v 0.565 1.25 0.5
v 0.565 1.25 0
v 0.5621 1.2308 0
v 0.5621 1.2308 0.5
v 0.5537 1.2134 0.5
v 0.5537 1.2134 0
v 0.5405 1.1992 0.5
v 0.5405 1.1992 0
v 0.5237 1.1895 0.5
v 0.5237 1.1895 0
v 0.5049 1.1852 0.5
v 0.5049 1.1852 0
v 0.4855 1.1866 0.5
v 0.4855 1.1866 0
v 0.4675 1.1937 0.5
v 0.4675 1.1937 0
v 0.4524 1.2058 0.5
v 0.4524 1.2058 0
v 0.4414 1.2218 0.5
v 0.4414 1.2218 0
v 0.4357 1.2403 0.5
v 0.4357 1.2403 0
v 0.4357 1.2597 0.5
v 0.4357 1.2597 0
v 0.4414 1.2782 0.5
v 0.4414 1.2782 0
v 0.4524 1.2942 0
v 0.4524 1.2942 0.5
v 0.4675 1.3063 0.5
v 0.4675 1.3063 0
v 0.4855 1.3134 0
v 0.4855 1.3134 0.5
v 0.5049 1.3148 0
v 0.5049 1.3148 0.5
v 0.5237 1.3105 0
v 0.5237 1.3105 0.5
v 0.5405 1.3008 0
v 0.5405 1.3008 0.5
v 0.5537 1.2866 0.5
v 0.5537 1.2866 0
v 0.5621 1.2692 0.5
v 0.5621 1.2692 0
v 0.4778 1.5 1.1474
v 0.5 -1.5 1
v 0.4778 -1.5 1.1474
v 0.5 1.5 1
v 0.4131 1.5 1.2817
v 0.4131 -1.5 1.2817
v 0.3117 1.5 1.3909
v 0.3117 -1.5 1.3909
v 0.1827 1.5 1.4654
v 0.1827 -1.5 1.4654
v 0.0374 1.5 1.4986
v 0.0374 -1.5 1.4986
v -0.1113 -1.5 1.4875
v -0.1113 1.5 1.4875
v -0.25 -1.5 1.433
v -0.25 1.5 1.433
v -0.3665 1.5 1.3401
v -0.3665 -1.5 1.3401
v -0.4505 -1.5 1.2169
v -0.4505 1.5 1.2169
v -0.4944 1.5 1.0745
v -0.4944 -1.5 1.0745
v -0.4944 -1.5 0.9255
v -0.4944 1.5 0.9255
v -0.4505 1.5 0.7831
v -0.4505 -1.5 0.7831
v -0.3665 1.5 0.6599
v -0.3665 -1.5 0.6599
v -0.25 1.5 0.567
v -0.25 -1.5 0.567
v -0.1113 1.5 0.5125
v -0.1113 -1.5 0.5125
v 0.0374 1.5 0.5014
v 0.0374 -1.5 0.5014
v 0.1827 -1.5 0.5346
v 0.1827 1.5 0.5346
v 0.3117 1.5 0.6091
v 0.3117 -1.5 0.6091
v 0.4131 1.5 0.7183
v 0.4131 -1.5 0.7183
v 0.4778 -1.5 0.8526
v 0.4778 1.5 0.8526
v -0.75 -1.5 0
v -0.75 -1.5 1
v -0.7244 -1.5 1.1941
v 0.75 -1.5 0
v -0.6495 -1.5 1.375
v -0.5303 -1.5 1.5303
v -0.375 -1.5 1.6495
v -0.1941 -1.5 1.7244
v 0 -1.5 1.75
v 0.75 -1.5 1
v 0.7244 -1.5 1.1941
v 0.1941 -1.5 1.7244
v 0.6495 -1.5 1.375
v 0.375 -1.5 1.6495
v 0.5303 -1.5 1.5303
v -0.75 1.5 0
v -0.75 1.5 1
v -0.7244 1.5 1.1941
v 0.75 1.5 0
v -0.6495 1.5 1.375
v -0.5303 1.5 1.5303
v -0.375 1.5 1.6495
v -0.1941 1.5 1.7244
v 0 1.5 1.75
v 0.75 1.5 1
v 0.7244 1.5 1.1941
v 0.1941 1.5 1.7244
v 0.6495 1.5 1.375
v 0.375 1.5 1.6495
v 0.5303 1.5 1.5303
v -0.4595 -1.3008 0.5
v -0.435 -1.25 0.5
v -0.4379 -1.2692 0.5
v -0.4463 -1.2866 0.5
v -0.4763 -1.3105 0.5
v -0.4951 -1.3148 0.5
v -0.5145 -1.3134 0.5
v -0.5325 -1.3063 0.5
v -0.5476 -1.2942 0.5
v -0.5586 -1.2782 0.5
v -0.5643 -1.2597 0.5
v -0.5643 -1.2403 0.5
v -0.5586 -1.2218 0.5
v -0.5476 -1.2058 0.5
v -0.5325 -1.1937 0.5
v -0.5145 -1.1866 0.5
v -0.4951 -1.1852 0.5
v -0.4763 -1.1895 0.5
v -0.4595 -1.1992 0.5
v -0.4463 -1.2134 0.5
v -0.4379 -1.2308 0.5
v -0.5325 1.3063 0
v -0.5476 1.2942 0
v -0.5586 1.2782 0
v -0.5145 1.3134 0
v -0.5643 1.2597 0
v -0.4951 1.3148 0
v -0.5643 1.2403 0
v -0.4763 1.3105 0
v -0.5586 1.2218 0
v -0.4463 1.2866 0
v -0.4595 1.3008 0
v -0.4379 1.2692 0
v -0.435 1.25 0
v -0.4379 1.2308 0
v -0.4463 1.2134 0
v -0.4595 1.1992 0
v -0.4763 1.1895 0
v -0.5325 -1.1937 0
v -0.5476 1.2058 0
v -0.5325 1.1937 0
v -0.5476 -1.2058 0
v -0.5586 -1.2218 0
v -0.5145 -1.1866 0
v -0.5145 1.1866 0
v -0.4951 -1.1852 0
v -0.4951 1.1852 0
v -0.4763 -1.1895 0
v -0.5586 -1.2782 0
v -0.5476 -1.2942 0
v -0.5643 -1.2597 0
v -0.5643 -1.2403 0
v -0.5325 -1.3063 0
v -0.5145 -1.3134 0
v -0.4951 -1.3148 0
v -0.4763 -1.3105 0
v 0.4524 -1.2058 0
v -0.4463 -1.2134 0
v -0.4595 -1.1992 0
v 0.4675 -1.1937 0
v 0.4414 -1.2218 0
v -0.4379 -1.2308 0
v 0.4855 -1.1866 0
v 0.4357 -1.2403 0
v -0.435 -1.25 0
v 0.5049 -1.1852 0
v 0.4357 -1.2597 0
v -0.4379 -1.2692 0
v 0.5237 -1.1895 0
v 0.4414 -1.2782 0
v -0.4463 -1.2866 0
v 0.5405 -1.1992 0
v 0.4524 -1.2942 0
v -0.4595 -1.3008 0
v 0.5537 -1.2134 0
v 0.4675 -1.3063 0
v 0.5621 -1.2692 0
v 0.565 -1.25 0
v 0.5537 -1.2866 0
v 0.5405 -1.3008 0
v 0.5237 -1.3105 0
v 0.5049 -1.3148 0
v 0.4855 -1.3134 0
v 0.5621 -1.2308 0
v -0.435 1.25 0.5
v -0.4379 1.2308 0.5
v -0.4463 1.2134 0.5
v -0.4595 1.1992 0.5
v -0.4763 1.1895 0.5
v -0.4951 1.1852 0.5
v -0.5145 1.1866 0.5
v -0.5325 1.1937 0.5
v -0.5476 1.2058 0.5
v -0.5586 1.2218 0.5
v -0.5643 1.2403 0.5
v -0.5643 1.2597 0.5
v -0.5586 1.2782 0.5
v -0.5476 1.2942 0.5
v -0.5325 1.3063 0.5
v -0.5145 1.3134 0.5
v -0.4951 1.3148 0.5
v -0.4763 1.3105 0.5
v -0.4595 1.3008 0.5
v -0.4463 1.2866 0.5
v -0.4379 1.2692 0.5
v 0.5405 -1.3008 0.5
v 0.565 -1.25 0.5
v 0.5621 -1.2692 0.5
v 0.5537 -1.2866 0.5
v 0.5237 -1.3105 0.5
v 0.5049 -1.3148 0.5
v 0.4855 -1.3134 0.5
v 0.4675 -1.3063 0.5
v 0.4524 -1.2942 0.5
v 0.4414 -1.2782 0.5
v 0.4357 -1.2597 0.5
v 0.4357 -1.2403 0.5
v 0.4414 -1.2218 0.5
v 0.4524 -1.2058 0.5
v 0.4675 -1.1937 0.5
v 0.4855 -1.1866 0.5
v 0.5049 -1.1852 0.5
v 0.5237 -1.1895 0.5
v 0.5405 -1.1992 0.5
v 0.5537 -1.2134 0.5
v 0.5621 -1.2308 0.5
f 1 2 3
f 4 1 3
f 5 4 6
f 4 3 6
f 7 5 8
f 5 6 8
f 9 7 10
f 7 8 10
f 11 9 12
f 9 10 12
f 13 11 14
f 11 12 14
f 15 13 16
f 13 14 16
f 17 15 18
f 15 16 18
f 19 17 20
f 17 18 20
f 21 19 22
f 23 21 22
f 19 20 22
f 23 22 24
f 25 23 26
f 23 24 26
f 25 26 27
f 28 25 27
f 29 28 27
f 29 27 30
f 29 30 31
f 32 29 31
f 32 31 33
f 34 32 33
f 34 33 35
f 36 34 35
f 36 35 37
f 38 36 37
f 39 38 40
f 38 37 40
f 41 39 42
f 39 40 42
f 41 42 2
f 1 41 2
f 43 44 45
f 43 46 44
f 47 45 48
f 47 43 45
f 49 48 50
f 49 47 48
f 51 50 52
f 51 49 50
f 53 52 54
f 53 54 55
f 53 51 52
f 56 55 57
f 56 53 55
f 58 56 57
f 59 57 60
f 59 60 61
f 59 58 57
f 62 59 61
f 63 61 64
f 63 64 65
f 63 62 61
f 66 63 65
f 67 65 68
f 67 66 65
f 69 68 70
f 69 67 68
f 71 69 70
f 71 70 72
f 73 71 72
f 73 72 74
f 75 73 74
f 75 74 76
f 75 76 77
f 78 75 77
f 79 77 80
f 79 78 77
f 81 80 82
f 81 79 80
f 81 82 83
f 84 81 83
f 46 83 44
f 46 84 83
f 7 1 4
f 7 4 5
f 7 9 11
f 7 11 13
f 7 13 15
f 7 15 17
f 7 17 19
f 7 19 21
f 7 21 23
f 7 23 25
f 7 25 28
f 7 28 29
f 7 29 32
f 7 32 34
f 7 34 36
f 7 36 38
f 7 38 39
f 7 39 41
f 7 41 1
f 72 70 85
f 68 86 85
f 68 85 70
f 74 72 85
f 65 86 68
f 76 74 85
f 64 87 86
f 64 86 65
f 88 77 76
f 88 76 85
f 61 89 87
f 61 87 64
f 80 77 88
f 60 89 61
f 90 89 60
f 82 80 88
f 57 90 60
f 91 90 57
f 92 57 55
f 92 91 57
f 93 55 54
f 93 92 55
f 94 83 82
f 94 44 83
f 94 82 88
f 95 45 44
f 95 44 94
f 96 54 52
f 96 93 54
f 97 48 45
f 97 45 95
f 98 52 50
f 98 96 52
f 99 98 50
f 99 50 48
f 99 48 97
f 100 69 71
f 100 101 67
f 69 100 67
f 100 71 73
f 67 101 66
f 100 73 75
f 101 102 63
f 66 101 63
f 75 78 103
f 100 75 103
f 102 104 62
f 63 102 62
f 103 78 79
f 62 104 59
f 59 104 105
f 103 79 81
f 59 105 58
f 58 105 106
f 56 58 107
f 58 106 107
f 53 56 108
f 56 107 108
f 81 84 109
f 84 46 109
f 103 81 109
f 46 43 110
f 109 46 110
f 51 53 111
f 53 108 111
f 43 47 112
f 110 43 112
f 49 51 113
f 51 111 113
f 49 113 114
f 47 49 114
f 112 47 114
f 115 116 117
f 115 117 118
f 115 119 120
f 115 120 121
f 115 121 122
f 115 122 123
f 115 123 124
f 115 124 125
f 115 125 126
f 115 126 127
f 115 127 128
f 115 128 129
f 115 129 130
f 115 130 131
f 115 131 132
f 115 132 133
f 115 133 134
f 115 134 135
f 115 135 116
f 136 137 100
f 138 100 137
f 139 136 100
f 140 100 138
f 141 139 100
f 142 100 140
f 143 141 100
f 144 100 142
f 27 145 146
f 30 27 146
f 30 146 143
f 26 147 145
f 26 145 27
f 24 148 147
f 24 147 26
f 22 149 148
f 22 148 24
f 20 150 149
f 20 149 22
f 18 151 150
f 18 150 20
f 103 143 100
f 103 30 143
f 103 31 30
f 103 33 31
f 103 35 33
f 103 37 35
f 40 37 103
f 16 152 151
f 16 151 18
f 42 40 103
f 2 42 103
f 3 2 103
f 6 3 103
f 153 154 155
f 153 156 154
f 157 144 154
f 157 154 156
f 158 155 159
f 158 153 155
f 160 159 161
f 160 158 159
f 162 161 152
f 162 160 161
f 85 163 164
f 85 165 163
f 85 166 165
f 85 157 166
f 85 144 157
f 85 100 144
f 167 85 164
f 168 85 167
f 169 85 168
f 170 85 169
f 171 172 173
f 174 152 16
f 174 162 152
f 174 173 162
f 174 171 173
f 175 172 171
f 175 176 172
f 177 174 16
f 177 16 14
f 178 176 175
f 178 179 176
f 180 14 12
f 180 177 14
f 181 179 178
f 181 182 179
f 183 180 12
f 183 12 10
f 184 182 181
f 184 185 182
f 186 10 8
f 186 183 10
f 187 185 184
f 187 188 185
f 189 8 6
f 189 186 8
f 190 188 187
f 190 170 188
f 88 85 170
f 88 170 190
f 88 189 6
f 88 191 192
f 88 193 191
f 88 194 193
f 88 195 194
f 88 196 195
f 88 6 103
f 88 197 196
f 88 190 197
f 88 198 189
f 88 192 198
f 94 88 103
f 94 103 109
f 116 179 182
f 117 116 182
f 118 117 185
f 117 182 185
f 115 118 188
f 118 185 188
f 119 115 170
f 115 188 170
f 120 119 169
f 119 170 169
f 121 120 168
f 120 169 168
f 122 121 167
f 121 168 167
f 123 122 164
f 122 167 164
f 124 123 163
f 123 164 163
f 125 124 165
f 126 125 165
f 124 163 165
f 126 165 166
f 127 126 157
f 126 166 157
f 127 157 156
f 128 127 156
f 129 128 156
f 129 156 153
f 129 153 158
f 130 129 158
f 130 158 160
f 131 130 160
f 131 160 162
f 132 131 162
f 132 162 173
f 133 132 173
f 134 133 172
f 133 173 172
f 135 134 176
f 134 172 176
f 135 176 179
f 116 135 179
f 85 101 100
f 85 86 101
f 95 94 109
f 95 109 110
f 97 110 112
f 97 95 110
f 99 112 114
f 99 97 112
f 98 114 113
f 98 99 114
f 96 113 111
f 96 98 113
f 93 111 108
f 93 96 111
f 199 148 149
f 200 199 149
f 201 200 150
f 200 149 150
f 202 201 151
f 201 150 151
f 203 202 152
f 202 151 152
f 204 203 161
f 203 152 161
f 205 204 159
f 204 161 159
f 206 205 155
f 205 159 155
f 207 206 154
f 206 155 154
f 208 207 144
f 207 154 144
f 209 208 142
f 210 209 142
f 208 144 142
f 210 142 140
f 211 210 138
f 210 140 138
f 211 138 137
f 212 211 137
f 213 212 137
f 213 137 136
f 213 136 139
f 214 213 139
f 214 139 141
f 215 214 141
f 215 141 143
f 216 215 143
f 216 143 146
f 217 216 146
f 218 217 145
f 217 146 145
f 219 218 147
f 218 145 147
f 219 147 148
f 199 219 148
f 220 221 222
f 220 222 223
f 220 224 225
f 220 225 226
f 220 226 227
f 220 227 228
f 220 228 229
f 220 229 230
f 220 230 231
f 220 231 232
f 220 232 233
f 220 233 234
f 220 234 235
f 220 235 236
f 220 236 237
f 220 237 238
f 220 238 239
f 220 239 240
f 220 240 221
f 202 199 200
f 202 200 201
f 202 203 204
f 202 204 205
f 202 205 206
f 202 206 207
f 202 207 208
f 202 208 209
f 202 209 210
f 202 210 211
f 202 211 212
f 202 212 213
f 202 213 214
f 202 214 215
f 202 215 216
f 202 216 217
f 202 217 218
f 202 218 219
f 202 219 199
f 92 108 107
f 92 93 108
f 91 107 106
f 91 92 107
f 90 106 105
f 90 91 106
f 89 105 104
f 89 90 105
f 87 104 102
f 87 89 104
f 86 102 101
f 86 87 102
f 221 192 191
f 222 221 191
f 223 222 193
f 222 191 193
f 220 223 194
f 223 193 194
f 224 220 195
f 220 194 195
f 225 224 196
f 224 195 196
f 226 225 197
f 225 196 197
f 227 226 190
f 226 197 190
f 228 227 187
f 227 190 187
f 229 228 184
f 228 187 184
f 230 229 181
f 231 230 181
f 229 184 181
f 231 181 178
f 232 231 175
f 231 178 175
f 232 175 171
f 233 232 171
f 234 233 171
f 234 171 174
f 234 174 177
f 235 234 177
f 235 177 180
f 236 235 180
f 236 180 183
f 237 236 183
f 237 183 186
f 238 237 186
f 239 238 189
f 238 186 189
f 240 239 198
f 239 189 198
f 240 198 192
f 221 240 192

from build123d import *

# Parameters (mm, degrees)
F0_R     = 0.5
F1_DEPTH = 1.5
F2_R     = 0.065
F3_DEPTH = 0.5


with BuildPart() as f1:
    # F0 (on Front) → F1 (new body, symmetric)
    with BuildSketch(Plane.XZ):
        with BuildLine():
            Line((-0.75, 0), (0, 0))
            Line((0, 0), (0.75, 0))
            Line((0.75, 0), (0.75, 1))
            ThreePointArc((0.75, 1), (0.53033, 1.53033), (0, 1.75))
            ThreePointArc((0, 1.75), (-0.53033, 1.53033), (-0.75, 1))
            Line((-0.75, 1), (-0.75, 0))
        make_face()
        with Locations((0, 1)):
            Circle(F0_R, mode=Mode.SUBTRACT)
    extrude(amount=F1_DEPTH, both=True)

    # F2 (on face) → F3 (cut)
    with BuildSketch(Plane(origin=(0, 0, 0), x_dir=(1, 0, 0), z_dir=(0, 0, -1))):
        with Locations((-0.5, 1.25)):
            Circle(F2_R)
        with Locations((0.5, 1.25)):
            Circle(F2_R)
        with Locations((0.5, -1.25)):
            Circle(F2_R)
        with Locations((-0.5, -1.25)):
            Circle(F2_R)
    extrude(amount=-F3_DEPTH, mode=Mode.SUBTRACT)


solid = f1.part
